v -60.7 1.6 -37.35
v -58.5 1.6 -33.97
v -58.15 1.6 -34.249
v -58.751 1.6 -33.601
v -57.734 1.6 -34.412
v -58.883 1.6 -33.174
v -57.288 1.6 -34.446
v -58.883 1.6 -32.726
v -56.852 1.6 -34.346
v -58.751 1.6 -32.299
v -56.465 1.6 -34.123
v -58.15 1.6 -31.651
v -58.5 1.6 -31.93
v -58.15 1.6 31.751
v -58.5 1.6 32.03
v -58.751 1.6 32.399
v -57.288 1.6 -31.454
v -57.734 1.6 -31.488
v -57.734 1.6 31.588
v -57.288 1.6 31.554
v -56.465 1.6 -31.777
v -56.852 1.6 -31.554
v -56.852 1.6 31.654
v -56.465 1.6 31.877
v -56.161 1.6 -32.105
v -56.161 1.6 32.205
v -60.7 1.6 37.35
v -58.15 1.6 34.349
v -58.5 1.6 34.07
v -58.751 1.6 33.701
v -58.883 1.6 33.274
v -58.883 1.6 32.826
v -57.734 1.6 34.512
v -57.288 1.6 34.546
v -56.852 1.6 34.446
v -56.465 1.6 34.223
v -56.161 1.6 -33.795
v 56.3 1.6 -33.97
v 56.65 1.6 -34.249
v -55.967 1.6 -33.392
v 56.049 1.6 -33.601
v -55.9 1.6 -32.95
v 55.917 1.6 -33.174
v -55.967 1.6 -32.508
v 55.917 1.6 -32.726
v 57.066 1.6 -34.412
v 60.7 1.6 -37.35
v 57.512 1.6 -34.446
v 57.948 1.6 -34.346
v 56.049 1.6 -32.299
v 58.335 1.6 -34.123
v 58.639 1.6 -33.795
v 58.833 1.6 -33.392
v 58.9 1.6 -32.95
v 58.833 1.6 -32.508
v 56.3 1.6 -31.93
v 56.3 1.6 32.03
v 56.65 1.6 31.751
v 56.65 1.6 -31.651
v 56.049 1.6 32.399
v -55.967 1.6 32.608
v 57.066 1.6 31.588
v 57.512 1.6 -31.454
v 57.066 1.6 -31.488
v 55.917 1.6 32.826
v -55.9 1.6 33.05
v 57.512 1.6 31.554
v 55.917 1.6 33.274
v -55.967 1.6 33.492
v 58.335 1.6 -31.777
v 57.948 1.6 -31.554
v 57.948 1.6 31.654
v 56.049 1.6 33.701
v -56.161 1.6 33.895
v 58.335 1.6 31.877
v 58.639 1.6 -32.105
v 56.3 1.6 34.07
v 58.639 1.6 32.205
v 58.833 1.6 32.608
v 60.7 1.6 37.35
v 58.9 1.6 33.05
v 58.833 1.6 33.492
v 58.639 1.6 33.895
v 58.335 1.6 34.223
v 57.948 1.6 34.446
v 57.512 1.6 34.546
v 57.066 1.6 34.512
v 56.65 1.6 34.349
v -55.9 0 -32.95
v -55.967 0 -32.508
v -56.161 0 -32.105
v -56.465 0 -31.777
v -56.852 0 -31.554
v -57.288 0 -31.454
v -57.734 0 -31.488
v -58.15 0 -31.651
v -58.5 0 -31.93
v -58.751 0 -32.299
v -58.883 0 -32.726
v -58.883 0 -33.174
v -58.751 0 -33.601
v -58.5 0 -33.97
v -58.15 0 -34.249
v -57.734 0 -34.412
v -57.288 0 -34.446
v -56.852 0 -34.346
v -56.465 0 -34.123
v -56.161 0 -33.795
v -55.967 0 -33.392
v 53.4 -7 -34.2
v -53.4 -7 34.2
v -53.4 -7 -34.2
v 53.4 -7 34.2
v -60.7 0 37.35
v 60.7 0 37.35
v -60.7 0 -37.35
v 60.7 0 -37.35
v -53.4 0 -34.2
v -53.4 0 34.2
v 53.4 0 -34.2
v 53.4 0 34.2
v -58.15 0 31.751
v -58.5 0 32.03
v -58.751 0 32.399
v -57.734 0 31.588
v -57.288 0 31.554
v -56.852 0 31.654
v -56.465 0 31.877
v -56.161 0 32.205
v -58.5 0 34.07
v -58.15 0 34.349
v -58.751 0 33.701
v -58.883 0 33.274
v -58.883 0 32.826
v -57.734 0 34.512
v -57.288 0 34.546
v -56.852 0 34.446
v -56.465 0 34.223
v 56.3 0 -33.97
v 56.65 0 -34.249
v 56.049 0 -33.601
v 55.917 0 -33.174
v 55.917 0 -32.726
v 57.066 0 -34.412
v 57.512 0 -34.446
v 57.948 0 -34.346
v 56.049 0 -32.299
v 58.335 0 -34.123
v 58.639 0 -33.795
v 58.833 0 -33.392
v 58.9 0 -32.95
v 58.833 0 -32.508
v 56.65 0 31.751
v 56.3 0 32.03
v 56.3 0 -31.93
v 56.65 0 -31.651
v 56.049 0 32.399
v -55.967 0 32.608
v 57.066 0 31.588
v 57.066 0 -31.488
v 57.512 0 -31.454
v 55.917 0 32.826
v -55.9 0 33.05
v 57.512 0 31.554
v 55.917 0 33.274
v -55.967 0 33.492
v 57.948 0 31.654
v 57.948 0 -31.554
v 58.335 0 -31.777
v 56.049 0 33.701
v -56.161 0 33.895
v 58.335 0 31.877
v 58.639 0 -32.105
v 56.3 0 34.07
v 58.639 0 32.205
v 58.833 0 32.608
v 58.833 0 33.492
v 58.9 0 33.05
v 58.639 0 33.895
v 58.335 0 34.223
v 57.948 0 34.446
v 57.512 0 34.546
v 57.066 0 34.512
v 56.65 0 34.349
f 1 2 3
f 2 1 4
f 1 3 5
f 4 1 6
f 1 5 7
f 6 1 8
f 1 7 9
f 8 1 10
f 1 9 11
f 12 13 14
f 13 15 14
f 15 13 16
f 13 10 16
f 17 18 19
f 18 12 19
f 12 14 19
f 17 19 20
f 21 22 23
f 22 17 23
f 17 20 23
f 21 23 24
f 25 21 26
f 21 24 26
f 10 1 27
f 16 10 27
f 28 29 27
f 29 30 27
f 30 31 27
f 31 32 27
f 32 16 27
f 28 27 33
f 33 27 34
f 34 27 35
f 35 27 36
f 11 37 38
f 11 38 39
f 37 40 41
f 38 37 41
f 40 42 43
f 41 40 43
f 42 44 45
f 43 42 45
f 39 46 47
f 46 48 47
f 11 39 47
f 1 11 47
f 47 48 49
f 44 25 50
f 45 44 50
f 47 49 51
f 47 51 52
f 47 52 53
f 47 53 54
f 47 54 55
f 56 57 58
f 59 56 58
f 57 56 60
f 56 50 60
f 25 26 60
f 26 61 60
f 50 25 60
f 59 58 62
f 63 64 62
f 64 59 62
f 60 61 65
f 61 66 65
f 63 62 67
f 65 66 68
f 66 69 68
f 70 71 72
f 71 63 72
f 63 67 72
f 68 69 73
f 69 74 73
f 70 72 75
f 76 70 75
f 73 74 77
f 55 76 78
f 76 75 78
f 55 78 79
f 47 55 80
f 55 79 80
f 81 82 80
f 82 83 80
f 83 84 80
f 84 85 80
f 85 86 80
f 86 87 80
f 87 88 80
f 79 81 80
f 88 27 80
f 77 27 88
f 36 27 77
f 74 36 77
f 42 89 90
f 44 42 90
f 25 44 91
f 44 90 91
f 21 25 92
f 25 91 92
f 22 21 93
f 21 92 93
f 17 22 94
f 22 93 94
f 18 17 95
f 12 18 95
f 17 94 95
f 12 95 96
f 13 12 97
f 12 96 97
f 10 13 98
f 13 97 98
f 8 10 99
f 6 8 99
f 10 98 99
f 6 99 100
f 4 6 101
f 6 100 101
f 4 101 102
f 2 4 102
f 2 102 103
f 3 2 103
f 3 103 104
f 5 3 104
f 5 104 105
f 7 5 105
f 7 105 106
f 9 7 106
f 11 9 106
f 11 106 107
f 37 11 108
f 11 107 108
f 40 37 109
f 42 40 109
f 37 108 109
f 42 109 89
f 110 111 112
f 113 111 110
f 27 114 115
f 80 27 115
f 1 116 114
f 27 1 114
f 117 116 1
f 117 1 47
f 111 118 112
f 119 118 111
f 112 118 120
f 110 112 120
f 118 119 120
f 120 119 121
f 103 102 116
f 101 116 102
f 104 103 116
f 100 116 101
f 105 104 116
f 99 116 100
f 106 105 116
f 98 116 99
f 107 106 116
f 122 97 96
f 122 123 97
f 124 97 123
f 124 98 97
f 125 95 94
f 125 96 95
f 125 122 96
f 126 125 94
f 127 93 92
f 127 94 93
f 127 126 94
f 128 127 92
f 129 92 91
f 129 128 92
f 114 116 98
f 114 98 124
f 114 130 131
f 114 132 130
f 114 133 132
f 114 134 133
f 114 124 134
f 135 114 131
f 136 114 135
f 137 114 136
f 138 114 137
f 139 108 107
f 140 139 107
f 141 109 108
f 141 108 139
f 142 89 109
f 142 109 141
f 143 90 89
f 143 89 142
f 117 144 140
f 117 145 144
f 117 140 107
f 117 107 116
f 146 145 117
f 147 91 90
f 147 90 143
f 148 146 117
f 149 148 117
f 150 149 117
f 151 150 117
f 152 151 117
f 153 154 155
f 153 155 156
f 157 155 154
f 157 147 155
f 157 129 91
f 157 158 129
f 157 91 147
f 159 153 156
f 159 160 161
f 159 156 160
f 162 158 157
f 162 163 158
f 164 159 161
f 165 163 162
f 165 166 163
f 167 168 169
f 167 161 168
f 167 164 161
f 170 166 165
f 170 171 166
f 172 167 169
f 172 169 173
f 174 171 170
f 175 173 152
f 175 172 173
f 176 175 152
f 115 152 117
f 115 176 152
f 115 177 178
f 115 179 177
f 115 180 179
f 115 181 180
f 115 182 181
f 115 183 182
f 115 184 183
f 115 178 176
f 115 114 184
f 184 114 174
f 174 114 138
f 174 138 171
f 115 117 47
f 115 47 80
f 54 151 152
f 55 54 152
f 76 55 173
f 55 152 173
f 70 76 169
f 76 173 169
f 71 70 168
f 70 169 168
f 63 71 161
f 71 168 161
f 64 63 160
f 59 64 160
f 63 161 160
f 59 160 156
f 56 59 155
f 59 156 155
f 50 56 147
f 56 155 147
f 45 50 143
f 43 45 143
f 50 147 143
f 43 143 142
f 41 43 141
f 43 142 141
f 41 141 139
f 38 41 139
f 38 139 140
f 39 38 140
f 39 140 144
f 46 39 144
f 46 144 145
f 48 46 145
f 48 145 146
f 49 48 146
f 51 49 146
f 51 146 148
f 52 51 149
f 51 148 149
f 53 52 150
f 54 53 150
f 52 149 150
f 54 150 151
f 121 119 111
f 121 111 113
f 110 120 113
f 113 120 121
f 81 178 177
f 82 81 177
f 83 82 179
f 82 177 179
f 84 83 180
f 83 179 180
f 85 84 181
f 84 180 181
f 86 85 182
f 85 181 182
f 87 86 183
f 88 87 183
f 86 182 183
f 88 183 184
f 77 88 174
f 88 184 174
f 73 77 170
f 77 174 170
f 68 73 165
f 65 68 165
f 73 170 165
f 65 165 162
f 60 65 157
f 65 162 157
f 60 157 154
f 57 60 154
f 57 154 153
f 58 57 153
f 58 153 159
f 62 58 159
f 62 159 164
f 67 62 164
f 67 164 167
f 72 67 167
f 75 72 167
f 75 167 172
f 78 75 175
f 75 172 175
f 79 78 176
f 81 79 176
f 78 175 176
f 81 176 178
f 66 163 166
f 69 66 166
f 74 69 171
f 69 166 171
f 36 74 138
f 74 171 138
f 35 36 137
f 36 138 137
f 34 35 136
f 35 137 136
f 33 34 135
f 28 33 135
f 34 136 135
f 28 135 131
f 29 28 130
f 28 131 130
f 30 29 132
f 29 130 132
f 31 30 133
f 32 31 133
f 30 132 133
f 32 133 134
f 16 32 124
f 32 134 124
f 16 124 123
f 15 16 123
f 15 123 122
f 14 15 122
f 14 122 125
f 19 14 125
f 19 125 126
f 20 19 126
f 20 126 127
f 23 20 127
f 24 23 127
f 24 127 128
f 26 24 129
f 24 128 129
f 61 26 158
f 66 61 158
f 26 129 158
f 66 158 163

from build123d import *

# Parameters (mm, degrees)
F0_W     = 121.4
F0_H     = 74.7
F0_R     = 1.5
F1_DEPTH = 1.6
F2_W     = 106.8
F2_H     = 68.4
F3_DEPTH = 7


with BuildPart() as f1:
    # F0 (on Front) → F1 (new body)
    with BuildSketch(Plane.XZ):
        Rectangle(F0_W, F0_H)
        with Locations((-57.4, -32.95)):
            Circle(F0_R, mode=Mode.SUBTRACT)
        with Locations((57.4, -32.95)):
            Circle(F0_R, mode=Mode.SUBTRACT)
        with Locations((-57.4, 33.05)):
            Circle(F0_R, mode=Mode.SUBTRACT)
        with Locations((57.4, 33.05)):
            Circle(F0_R, mode=Mode.SUBTRACT)
    extrude(amount=-F1_DEPTH)


with BuildPart() as f3:
    # F2 (on face) → F3 (new body)
    with BuildSketch(Plane.XZ):
        Rectangle(F2_W, F2_H)
    extrude(amount=F3_DEPTH)


solid = Compound([f1.part, f3.part])
